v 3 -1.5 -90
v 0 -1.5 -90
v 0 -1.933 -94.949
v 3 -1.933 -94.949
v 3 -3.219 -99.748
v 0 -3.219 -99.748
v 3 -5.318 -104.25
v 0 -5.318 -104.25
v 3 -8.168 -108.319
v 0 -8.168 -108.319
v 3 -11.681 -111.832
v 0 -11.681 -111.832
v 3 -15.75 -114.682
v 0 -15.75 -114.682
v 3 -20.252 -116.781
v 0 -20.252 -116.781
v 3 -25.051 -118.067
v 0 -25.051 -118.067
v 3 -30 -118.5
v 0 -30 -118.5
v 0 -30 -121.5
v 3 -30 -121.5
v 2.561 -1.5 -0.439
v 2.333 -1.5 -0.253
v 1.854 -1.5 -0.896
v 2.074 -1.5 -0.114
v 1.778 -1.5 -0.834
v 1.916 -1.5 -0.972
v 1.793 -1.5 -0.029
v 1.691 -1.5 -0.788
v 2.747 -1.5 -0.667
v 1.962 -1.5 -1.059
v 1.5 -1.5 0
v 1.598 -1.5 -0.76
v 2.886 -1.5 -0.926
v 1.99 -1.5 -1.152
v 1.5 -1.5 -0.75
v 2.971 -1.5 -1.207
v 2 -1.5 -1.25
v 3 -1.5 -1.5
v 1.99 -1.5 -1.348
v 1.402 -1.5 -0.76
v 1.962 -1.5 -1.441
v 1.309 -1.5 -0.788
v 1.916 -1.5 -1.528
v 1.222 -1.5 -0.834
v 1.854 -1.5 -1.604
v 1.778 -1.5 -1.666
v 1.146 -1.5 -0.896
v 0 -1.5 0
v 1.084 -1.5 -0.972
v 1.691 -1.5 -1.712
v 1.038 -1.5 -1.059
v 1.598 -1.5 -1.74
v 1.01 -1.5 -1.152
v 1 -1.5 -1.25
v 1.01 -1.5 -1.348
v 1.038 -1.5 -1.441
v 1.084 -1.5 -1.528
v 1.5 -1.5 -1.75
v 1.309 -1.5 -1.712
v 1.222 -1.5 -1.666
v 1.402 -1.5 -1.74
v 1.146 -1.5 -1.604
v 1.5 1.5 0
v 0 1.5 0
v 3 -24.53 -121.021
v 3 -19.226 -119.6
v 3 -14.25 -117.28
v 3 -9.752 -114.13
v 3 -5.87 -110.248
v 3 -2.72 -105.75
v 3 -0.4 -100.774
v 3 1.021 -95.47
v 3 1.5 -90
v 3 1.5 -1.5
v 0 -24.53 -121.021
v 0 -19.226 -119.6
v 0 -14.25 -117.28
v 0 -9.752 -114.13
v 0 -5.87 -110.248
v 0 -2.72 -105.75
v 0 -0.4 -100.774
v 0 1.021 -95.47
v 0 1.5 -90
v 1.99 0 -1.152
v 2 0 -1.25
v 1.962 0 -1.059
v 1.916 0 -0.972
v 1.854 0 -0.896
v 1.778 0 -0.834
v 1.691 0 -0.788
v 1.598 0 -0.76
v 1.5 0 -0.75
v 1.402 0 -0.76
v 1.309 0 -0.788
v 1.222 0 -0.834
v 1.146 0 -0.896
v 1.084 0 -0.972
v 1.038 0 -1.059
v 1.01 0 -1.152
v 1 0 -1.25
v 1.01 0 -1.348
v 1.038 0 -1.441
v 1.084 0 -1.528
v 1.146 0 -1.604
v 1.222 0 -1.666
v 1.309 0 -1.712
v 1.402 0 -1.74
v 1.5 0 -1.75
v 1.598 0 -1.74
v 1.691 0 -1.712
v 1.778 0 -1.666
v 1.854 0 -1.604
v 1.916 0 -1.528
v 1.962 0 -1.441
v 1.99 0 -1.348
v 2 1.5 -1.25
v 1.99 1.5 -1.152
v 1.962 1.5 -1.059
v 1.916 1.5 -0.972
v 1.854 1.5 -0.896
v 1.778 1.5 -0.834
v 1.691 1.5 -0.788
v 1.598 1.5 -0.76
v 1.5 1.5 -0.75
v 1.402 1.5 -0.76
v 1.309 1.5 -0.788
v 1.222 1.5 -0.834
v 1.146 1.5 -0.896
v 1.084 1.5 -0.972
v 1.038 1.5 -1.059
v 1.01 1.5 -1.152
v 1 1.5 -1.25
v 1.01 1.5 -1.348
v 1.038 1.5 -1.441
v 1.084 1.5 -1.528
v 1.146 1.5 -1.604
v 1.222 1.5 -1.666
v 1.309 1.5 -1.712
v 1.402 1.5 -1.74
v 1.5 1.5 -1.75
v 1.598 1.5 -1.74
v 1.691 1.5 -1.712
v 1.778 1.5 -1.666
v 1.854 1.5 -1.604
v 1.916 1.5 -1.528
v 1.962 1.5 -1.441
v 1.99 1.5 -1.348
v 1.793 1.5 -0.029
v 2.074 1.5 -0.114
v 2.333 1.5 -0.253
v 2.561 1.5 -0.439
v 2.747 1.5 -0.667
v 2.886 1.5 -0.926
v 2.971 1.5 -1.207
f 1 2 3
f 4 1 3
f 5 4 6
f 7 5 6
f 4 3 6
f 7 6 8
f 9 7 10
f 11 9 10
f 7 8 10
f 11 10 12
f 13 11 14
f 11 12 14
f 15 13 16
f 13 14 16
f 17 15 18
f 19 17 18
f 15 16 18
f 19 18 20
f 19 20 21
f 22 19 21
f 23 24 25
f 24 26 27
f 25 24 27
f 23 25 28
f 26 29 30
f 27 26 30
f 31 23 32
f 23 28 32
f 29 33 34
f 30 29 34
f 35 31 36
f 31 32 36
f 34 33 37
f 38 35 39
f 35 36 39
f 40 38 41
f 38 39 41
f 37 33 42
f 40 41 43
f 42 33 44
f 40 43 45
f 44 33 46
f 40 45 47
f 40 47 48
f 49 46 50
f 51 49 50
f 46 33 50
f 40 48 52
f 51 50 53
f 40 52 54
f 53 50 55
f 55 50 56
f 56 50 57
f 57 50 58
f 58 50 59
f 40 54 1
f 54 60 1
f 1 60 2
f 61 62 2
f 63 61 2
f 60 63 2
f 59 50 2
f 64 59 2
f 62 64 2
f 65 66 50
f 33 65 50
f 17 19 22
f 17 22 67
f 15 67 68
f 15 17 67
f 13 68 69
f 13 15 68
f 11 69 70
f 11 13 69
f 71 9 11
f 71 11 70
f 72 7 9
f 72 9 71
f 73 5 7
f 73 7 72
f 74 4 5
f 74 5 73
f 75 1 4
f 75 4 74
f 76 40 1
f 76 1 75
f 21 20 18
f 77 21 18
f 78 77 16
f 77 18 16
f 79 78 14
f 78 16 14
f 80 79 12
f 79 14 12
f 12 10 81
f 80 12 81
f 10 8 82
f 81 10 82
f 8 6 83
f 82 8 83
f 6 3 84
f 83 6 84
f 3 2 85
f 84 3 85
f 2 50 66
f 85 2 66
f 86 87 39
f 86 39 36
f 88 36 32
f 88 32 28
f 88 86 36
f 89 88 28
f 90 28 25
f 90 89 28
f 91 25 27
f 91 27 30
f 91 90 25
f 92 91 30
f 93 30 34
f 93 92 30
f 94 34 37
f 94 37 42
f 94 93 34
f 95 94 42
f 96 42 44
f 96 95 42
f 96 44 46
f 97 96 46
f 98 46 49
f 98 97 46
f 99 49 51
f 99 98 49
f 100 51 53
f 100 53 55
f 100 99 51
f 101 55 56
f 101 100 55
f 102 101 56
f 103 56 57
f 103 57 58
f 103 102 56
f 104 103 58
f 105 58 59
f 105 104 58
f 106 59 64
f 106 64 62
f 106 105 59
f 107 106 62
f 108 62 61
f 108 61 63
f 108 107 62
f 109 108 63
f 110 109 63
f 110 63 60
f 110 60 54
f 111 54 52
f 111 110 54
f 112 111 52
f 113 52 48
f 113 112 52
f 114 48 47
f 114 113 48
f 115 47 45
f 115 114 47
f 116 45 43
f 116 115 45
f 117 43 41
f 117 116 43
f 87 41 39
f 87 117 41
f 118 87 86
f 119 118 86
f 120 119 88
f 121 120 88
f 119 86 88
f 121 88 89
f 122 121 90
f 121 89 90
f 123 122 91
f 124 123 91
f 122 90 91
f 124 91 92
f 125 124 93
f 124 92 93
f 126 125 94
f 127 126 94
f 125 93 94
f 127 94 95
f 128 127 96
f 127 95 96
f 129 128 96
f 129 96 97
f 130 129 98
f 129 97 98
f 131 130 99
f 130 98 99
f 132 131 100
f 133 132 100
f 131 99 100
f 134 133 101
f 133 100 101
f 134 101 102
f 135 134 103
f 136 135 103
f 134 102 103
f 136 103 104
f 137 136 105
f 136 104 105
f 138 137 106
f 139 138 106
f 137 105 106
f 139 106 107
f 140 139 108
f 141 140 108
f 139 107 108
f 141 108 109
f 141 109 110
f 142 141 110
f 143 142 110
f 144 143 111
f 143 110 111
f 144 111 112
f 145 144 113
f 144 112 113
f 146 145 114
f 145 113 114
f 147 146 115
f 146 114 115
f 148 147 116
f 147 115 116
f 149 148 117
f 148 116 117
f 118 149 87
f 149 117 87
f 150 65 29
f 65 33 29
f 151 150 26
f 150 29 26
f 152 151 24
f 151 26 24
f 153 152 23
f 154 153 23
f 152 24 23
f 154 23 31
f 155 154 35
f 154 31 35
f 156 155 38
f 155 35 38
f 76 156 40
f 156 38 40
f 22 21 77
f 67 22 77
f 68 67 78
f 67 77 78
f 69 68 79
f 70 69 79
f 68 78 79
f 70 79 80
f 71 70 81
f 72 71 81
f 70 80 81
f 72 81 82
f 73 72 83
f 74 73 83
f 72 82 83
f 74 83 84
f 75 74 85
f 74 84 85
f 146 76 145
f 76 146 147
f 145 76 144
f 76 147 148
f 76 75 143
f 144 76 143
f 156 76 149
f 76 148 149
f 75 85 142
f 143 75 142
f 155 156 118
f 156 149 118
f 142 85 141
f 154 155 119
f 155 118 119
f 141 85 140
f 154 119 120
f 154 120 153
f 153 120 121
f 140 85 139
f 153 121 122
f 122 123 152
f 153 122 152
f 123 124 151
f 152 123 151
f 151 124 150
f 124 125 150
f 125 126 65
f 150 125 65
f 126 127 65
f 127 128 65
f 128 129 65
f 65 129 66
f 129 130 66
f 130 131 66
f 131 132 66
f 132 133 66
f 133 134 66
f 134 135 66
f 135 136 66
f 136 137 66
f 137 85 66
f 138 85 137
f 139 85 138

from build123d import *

# Parameters (mm, degrees)
F2_DEPTH = 3
F1_R     = 0.5
F3_DEPTH = 1.5
F4_DEPTH = 1.5
F5_R     = 1.5


with BuildPart() as f2:
    # F0 (on Right) → F2 (new body)
    with BuildSketch(Plane.YZ):
        with BuildLine():
            Line((1.5, 0), (-1.5, 0))
            Line((-1.5, 0), (-1.5, -90))
            ThreePointArc((-1.5, -90), (-9.847457, -110.152543), (-30, -118.5))
            Line((-30, -118.5), (-30, -121.5))
            ThreePointArc((-30, -121.5), (-7.726136, -112.273864), (1.5, -90))
            Line((1.5, -90), (1.5, 0))
        make_face()
    extrude(amount=F2_DEPTH)

    # F1 (on Front) → F3 (cut)
    with BuildSketch(Plane.XZ):
        with Locations((1.5, -1.25)):
            Circle(F1_R)
    extrude(amount=-F3_DEPTH, mode=Mode.SUBTRACT)

    # F1 (on Front) → F4 (cut)
    with BuildSketch(Plane.XZ):
        with Locations((1.5, -1.25)):
            Circle(F1_R)
    extrude(amount=F4_DEPTH, mode=Mode.SUBTRACT)

    # F5
    f5_edges = [f2.edges().sort_by_distance(p)[0] for p in [
        (3, 0, 0),
    ]]
    fillet(f5_edges, radius=F5_R)


solid = f2.part
